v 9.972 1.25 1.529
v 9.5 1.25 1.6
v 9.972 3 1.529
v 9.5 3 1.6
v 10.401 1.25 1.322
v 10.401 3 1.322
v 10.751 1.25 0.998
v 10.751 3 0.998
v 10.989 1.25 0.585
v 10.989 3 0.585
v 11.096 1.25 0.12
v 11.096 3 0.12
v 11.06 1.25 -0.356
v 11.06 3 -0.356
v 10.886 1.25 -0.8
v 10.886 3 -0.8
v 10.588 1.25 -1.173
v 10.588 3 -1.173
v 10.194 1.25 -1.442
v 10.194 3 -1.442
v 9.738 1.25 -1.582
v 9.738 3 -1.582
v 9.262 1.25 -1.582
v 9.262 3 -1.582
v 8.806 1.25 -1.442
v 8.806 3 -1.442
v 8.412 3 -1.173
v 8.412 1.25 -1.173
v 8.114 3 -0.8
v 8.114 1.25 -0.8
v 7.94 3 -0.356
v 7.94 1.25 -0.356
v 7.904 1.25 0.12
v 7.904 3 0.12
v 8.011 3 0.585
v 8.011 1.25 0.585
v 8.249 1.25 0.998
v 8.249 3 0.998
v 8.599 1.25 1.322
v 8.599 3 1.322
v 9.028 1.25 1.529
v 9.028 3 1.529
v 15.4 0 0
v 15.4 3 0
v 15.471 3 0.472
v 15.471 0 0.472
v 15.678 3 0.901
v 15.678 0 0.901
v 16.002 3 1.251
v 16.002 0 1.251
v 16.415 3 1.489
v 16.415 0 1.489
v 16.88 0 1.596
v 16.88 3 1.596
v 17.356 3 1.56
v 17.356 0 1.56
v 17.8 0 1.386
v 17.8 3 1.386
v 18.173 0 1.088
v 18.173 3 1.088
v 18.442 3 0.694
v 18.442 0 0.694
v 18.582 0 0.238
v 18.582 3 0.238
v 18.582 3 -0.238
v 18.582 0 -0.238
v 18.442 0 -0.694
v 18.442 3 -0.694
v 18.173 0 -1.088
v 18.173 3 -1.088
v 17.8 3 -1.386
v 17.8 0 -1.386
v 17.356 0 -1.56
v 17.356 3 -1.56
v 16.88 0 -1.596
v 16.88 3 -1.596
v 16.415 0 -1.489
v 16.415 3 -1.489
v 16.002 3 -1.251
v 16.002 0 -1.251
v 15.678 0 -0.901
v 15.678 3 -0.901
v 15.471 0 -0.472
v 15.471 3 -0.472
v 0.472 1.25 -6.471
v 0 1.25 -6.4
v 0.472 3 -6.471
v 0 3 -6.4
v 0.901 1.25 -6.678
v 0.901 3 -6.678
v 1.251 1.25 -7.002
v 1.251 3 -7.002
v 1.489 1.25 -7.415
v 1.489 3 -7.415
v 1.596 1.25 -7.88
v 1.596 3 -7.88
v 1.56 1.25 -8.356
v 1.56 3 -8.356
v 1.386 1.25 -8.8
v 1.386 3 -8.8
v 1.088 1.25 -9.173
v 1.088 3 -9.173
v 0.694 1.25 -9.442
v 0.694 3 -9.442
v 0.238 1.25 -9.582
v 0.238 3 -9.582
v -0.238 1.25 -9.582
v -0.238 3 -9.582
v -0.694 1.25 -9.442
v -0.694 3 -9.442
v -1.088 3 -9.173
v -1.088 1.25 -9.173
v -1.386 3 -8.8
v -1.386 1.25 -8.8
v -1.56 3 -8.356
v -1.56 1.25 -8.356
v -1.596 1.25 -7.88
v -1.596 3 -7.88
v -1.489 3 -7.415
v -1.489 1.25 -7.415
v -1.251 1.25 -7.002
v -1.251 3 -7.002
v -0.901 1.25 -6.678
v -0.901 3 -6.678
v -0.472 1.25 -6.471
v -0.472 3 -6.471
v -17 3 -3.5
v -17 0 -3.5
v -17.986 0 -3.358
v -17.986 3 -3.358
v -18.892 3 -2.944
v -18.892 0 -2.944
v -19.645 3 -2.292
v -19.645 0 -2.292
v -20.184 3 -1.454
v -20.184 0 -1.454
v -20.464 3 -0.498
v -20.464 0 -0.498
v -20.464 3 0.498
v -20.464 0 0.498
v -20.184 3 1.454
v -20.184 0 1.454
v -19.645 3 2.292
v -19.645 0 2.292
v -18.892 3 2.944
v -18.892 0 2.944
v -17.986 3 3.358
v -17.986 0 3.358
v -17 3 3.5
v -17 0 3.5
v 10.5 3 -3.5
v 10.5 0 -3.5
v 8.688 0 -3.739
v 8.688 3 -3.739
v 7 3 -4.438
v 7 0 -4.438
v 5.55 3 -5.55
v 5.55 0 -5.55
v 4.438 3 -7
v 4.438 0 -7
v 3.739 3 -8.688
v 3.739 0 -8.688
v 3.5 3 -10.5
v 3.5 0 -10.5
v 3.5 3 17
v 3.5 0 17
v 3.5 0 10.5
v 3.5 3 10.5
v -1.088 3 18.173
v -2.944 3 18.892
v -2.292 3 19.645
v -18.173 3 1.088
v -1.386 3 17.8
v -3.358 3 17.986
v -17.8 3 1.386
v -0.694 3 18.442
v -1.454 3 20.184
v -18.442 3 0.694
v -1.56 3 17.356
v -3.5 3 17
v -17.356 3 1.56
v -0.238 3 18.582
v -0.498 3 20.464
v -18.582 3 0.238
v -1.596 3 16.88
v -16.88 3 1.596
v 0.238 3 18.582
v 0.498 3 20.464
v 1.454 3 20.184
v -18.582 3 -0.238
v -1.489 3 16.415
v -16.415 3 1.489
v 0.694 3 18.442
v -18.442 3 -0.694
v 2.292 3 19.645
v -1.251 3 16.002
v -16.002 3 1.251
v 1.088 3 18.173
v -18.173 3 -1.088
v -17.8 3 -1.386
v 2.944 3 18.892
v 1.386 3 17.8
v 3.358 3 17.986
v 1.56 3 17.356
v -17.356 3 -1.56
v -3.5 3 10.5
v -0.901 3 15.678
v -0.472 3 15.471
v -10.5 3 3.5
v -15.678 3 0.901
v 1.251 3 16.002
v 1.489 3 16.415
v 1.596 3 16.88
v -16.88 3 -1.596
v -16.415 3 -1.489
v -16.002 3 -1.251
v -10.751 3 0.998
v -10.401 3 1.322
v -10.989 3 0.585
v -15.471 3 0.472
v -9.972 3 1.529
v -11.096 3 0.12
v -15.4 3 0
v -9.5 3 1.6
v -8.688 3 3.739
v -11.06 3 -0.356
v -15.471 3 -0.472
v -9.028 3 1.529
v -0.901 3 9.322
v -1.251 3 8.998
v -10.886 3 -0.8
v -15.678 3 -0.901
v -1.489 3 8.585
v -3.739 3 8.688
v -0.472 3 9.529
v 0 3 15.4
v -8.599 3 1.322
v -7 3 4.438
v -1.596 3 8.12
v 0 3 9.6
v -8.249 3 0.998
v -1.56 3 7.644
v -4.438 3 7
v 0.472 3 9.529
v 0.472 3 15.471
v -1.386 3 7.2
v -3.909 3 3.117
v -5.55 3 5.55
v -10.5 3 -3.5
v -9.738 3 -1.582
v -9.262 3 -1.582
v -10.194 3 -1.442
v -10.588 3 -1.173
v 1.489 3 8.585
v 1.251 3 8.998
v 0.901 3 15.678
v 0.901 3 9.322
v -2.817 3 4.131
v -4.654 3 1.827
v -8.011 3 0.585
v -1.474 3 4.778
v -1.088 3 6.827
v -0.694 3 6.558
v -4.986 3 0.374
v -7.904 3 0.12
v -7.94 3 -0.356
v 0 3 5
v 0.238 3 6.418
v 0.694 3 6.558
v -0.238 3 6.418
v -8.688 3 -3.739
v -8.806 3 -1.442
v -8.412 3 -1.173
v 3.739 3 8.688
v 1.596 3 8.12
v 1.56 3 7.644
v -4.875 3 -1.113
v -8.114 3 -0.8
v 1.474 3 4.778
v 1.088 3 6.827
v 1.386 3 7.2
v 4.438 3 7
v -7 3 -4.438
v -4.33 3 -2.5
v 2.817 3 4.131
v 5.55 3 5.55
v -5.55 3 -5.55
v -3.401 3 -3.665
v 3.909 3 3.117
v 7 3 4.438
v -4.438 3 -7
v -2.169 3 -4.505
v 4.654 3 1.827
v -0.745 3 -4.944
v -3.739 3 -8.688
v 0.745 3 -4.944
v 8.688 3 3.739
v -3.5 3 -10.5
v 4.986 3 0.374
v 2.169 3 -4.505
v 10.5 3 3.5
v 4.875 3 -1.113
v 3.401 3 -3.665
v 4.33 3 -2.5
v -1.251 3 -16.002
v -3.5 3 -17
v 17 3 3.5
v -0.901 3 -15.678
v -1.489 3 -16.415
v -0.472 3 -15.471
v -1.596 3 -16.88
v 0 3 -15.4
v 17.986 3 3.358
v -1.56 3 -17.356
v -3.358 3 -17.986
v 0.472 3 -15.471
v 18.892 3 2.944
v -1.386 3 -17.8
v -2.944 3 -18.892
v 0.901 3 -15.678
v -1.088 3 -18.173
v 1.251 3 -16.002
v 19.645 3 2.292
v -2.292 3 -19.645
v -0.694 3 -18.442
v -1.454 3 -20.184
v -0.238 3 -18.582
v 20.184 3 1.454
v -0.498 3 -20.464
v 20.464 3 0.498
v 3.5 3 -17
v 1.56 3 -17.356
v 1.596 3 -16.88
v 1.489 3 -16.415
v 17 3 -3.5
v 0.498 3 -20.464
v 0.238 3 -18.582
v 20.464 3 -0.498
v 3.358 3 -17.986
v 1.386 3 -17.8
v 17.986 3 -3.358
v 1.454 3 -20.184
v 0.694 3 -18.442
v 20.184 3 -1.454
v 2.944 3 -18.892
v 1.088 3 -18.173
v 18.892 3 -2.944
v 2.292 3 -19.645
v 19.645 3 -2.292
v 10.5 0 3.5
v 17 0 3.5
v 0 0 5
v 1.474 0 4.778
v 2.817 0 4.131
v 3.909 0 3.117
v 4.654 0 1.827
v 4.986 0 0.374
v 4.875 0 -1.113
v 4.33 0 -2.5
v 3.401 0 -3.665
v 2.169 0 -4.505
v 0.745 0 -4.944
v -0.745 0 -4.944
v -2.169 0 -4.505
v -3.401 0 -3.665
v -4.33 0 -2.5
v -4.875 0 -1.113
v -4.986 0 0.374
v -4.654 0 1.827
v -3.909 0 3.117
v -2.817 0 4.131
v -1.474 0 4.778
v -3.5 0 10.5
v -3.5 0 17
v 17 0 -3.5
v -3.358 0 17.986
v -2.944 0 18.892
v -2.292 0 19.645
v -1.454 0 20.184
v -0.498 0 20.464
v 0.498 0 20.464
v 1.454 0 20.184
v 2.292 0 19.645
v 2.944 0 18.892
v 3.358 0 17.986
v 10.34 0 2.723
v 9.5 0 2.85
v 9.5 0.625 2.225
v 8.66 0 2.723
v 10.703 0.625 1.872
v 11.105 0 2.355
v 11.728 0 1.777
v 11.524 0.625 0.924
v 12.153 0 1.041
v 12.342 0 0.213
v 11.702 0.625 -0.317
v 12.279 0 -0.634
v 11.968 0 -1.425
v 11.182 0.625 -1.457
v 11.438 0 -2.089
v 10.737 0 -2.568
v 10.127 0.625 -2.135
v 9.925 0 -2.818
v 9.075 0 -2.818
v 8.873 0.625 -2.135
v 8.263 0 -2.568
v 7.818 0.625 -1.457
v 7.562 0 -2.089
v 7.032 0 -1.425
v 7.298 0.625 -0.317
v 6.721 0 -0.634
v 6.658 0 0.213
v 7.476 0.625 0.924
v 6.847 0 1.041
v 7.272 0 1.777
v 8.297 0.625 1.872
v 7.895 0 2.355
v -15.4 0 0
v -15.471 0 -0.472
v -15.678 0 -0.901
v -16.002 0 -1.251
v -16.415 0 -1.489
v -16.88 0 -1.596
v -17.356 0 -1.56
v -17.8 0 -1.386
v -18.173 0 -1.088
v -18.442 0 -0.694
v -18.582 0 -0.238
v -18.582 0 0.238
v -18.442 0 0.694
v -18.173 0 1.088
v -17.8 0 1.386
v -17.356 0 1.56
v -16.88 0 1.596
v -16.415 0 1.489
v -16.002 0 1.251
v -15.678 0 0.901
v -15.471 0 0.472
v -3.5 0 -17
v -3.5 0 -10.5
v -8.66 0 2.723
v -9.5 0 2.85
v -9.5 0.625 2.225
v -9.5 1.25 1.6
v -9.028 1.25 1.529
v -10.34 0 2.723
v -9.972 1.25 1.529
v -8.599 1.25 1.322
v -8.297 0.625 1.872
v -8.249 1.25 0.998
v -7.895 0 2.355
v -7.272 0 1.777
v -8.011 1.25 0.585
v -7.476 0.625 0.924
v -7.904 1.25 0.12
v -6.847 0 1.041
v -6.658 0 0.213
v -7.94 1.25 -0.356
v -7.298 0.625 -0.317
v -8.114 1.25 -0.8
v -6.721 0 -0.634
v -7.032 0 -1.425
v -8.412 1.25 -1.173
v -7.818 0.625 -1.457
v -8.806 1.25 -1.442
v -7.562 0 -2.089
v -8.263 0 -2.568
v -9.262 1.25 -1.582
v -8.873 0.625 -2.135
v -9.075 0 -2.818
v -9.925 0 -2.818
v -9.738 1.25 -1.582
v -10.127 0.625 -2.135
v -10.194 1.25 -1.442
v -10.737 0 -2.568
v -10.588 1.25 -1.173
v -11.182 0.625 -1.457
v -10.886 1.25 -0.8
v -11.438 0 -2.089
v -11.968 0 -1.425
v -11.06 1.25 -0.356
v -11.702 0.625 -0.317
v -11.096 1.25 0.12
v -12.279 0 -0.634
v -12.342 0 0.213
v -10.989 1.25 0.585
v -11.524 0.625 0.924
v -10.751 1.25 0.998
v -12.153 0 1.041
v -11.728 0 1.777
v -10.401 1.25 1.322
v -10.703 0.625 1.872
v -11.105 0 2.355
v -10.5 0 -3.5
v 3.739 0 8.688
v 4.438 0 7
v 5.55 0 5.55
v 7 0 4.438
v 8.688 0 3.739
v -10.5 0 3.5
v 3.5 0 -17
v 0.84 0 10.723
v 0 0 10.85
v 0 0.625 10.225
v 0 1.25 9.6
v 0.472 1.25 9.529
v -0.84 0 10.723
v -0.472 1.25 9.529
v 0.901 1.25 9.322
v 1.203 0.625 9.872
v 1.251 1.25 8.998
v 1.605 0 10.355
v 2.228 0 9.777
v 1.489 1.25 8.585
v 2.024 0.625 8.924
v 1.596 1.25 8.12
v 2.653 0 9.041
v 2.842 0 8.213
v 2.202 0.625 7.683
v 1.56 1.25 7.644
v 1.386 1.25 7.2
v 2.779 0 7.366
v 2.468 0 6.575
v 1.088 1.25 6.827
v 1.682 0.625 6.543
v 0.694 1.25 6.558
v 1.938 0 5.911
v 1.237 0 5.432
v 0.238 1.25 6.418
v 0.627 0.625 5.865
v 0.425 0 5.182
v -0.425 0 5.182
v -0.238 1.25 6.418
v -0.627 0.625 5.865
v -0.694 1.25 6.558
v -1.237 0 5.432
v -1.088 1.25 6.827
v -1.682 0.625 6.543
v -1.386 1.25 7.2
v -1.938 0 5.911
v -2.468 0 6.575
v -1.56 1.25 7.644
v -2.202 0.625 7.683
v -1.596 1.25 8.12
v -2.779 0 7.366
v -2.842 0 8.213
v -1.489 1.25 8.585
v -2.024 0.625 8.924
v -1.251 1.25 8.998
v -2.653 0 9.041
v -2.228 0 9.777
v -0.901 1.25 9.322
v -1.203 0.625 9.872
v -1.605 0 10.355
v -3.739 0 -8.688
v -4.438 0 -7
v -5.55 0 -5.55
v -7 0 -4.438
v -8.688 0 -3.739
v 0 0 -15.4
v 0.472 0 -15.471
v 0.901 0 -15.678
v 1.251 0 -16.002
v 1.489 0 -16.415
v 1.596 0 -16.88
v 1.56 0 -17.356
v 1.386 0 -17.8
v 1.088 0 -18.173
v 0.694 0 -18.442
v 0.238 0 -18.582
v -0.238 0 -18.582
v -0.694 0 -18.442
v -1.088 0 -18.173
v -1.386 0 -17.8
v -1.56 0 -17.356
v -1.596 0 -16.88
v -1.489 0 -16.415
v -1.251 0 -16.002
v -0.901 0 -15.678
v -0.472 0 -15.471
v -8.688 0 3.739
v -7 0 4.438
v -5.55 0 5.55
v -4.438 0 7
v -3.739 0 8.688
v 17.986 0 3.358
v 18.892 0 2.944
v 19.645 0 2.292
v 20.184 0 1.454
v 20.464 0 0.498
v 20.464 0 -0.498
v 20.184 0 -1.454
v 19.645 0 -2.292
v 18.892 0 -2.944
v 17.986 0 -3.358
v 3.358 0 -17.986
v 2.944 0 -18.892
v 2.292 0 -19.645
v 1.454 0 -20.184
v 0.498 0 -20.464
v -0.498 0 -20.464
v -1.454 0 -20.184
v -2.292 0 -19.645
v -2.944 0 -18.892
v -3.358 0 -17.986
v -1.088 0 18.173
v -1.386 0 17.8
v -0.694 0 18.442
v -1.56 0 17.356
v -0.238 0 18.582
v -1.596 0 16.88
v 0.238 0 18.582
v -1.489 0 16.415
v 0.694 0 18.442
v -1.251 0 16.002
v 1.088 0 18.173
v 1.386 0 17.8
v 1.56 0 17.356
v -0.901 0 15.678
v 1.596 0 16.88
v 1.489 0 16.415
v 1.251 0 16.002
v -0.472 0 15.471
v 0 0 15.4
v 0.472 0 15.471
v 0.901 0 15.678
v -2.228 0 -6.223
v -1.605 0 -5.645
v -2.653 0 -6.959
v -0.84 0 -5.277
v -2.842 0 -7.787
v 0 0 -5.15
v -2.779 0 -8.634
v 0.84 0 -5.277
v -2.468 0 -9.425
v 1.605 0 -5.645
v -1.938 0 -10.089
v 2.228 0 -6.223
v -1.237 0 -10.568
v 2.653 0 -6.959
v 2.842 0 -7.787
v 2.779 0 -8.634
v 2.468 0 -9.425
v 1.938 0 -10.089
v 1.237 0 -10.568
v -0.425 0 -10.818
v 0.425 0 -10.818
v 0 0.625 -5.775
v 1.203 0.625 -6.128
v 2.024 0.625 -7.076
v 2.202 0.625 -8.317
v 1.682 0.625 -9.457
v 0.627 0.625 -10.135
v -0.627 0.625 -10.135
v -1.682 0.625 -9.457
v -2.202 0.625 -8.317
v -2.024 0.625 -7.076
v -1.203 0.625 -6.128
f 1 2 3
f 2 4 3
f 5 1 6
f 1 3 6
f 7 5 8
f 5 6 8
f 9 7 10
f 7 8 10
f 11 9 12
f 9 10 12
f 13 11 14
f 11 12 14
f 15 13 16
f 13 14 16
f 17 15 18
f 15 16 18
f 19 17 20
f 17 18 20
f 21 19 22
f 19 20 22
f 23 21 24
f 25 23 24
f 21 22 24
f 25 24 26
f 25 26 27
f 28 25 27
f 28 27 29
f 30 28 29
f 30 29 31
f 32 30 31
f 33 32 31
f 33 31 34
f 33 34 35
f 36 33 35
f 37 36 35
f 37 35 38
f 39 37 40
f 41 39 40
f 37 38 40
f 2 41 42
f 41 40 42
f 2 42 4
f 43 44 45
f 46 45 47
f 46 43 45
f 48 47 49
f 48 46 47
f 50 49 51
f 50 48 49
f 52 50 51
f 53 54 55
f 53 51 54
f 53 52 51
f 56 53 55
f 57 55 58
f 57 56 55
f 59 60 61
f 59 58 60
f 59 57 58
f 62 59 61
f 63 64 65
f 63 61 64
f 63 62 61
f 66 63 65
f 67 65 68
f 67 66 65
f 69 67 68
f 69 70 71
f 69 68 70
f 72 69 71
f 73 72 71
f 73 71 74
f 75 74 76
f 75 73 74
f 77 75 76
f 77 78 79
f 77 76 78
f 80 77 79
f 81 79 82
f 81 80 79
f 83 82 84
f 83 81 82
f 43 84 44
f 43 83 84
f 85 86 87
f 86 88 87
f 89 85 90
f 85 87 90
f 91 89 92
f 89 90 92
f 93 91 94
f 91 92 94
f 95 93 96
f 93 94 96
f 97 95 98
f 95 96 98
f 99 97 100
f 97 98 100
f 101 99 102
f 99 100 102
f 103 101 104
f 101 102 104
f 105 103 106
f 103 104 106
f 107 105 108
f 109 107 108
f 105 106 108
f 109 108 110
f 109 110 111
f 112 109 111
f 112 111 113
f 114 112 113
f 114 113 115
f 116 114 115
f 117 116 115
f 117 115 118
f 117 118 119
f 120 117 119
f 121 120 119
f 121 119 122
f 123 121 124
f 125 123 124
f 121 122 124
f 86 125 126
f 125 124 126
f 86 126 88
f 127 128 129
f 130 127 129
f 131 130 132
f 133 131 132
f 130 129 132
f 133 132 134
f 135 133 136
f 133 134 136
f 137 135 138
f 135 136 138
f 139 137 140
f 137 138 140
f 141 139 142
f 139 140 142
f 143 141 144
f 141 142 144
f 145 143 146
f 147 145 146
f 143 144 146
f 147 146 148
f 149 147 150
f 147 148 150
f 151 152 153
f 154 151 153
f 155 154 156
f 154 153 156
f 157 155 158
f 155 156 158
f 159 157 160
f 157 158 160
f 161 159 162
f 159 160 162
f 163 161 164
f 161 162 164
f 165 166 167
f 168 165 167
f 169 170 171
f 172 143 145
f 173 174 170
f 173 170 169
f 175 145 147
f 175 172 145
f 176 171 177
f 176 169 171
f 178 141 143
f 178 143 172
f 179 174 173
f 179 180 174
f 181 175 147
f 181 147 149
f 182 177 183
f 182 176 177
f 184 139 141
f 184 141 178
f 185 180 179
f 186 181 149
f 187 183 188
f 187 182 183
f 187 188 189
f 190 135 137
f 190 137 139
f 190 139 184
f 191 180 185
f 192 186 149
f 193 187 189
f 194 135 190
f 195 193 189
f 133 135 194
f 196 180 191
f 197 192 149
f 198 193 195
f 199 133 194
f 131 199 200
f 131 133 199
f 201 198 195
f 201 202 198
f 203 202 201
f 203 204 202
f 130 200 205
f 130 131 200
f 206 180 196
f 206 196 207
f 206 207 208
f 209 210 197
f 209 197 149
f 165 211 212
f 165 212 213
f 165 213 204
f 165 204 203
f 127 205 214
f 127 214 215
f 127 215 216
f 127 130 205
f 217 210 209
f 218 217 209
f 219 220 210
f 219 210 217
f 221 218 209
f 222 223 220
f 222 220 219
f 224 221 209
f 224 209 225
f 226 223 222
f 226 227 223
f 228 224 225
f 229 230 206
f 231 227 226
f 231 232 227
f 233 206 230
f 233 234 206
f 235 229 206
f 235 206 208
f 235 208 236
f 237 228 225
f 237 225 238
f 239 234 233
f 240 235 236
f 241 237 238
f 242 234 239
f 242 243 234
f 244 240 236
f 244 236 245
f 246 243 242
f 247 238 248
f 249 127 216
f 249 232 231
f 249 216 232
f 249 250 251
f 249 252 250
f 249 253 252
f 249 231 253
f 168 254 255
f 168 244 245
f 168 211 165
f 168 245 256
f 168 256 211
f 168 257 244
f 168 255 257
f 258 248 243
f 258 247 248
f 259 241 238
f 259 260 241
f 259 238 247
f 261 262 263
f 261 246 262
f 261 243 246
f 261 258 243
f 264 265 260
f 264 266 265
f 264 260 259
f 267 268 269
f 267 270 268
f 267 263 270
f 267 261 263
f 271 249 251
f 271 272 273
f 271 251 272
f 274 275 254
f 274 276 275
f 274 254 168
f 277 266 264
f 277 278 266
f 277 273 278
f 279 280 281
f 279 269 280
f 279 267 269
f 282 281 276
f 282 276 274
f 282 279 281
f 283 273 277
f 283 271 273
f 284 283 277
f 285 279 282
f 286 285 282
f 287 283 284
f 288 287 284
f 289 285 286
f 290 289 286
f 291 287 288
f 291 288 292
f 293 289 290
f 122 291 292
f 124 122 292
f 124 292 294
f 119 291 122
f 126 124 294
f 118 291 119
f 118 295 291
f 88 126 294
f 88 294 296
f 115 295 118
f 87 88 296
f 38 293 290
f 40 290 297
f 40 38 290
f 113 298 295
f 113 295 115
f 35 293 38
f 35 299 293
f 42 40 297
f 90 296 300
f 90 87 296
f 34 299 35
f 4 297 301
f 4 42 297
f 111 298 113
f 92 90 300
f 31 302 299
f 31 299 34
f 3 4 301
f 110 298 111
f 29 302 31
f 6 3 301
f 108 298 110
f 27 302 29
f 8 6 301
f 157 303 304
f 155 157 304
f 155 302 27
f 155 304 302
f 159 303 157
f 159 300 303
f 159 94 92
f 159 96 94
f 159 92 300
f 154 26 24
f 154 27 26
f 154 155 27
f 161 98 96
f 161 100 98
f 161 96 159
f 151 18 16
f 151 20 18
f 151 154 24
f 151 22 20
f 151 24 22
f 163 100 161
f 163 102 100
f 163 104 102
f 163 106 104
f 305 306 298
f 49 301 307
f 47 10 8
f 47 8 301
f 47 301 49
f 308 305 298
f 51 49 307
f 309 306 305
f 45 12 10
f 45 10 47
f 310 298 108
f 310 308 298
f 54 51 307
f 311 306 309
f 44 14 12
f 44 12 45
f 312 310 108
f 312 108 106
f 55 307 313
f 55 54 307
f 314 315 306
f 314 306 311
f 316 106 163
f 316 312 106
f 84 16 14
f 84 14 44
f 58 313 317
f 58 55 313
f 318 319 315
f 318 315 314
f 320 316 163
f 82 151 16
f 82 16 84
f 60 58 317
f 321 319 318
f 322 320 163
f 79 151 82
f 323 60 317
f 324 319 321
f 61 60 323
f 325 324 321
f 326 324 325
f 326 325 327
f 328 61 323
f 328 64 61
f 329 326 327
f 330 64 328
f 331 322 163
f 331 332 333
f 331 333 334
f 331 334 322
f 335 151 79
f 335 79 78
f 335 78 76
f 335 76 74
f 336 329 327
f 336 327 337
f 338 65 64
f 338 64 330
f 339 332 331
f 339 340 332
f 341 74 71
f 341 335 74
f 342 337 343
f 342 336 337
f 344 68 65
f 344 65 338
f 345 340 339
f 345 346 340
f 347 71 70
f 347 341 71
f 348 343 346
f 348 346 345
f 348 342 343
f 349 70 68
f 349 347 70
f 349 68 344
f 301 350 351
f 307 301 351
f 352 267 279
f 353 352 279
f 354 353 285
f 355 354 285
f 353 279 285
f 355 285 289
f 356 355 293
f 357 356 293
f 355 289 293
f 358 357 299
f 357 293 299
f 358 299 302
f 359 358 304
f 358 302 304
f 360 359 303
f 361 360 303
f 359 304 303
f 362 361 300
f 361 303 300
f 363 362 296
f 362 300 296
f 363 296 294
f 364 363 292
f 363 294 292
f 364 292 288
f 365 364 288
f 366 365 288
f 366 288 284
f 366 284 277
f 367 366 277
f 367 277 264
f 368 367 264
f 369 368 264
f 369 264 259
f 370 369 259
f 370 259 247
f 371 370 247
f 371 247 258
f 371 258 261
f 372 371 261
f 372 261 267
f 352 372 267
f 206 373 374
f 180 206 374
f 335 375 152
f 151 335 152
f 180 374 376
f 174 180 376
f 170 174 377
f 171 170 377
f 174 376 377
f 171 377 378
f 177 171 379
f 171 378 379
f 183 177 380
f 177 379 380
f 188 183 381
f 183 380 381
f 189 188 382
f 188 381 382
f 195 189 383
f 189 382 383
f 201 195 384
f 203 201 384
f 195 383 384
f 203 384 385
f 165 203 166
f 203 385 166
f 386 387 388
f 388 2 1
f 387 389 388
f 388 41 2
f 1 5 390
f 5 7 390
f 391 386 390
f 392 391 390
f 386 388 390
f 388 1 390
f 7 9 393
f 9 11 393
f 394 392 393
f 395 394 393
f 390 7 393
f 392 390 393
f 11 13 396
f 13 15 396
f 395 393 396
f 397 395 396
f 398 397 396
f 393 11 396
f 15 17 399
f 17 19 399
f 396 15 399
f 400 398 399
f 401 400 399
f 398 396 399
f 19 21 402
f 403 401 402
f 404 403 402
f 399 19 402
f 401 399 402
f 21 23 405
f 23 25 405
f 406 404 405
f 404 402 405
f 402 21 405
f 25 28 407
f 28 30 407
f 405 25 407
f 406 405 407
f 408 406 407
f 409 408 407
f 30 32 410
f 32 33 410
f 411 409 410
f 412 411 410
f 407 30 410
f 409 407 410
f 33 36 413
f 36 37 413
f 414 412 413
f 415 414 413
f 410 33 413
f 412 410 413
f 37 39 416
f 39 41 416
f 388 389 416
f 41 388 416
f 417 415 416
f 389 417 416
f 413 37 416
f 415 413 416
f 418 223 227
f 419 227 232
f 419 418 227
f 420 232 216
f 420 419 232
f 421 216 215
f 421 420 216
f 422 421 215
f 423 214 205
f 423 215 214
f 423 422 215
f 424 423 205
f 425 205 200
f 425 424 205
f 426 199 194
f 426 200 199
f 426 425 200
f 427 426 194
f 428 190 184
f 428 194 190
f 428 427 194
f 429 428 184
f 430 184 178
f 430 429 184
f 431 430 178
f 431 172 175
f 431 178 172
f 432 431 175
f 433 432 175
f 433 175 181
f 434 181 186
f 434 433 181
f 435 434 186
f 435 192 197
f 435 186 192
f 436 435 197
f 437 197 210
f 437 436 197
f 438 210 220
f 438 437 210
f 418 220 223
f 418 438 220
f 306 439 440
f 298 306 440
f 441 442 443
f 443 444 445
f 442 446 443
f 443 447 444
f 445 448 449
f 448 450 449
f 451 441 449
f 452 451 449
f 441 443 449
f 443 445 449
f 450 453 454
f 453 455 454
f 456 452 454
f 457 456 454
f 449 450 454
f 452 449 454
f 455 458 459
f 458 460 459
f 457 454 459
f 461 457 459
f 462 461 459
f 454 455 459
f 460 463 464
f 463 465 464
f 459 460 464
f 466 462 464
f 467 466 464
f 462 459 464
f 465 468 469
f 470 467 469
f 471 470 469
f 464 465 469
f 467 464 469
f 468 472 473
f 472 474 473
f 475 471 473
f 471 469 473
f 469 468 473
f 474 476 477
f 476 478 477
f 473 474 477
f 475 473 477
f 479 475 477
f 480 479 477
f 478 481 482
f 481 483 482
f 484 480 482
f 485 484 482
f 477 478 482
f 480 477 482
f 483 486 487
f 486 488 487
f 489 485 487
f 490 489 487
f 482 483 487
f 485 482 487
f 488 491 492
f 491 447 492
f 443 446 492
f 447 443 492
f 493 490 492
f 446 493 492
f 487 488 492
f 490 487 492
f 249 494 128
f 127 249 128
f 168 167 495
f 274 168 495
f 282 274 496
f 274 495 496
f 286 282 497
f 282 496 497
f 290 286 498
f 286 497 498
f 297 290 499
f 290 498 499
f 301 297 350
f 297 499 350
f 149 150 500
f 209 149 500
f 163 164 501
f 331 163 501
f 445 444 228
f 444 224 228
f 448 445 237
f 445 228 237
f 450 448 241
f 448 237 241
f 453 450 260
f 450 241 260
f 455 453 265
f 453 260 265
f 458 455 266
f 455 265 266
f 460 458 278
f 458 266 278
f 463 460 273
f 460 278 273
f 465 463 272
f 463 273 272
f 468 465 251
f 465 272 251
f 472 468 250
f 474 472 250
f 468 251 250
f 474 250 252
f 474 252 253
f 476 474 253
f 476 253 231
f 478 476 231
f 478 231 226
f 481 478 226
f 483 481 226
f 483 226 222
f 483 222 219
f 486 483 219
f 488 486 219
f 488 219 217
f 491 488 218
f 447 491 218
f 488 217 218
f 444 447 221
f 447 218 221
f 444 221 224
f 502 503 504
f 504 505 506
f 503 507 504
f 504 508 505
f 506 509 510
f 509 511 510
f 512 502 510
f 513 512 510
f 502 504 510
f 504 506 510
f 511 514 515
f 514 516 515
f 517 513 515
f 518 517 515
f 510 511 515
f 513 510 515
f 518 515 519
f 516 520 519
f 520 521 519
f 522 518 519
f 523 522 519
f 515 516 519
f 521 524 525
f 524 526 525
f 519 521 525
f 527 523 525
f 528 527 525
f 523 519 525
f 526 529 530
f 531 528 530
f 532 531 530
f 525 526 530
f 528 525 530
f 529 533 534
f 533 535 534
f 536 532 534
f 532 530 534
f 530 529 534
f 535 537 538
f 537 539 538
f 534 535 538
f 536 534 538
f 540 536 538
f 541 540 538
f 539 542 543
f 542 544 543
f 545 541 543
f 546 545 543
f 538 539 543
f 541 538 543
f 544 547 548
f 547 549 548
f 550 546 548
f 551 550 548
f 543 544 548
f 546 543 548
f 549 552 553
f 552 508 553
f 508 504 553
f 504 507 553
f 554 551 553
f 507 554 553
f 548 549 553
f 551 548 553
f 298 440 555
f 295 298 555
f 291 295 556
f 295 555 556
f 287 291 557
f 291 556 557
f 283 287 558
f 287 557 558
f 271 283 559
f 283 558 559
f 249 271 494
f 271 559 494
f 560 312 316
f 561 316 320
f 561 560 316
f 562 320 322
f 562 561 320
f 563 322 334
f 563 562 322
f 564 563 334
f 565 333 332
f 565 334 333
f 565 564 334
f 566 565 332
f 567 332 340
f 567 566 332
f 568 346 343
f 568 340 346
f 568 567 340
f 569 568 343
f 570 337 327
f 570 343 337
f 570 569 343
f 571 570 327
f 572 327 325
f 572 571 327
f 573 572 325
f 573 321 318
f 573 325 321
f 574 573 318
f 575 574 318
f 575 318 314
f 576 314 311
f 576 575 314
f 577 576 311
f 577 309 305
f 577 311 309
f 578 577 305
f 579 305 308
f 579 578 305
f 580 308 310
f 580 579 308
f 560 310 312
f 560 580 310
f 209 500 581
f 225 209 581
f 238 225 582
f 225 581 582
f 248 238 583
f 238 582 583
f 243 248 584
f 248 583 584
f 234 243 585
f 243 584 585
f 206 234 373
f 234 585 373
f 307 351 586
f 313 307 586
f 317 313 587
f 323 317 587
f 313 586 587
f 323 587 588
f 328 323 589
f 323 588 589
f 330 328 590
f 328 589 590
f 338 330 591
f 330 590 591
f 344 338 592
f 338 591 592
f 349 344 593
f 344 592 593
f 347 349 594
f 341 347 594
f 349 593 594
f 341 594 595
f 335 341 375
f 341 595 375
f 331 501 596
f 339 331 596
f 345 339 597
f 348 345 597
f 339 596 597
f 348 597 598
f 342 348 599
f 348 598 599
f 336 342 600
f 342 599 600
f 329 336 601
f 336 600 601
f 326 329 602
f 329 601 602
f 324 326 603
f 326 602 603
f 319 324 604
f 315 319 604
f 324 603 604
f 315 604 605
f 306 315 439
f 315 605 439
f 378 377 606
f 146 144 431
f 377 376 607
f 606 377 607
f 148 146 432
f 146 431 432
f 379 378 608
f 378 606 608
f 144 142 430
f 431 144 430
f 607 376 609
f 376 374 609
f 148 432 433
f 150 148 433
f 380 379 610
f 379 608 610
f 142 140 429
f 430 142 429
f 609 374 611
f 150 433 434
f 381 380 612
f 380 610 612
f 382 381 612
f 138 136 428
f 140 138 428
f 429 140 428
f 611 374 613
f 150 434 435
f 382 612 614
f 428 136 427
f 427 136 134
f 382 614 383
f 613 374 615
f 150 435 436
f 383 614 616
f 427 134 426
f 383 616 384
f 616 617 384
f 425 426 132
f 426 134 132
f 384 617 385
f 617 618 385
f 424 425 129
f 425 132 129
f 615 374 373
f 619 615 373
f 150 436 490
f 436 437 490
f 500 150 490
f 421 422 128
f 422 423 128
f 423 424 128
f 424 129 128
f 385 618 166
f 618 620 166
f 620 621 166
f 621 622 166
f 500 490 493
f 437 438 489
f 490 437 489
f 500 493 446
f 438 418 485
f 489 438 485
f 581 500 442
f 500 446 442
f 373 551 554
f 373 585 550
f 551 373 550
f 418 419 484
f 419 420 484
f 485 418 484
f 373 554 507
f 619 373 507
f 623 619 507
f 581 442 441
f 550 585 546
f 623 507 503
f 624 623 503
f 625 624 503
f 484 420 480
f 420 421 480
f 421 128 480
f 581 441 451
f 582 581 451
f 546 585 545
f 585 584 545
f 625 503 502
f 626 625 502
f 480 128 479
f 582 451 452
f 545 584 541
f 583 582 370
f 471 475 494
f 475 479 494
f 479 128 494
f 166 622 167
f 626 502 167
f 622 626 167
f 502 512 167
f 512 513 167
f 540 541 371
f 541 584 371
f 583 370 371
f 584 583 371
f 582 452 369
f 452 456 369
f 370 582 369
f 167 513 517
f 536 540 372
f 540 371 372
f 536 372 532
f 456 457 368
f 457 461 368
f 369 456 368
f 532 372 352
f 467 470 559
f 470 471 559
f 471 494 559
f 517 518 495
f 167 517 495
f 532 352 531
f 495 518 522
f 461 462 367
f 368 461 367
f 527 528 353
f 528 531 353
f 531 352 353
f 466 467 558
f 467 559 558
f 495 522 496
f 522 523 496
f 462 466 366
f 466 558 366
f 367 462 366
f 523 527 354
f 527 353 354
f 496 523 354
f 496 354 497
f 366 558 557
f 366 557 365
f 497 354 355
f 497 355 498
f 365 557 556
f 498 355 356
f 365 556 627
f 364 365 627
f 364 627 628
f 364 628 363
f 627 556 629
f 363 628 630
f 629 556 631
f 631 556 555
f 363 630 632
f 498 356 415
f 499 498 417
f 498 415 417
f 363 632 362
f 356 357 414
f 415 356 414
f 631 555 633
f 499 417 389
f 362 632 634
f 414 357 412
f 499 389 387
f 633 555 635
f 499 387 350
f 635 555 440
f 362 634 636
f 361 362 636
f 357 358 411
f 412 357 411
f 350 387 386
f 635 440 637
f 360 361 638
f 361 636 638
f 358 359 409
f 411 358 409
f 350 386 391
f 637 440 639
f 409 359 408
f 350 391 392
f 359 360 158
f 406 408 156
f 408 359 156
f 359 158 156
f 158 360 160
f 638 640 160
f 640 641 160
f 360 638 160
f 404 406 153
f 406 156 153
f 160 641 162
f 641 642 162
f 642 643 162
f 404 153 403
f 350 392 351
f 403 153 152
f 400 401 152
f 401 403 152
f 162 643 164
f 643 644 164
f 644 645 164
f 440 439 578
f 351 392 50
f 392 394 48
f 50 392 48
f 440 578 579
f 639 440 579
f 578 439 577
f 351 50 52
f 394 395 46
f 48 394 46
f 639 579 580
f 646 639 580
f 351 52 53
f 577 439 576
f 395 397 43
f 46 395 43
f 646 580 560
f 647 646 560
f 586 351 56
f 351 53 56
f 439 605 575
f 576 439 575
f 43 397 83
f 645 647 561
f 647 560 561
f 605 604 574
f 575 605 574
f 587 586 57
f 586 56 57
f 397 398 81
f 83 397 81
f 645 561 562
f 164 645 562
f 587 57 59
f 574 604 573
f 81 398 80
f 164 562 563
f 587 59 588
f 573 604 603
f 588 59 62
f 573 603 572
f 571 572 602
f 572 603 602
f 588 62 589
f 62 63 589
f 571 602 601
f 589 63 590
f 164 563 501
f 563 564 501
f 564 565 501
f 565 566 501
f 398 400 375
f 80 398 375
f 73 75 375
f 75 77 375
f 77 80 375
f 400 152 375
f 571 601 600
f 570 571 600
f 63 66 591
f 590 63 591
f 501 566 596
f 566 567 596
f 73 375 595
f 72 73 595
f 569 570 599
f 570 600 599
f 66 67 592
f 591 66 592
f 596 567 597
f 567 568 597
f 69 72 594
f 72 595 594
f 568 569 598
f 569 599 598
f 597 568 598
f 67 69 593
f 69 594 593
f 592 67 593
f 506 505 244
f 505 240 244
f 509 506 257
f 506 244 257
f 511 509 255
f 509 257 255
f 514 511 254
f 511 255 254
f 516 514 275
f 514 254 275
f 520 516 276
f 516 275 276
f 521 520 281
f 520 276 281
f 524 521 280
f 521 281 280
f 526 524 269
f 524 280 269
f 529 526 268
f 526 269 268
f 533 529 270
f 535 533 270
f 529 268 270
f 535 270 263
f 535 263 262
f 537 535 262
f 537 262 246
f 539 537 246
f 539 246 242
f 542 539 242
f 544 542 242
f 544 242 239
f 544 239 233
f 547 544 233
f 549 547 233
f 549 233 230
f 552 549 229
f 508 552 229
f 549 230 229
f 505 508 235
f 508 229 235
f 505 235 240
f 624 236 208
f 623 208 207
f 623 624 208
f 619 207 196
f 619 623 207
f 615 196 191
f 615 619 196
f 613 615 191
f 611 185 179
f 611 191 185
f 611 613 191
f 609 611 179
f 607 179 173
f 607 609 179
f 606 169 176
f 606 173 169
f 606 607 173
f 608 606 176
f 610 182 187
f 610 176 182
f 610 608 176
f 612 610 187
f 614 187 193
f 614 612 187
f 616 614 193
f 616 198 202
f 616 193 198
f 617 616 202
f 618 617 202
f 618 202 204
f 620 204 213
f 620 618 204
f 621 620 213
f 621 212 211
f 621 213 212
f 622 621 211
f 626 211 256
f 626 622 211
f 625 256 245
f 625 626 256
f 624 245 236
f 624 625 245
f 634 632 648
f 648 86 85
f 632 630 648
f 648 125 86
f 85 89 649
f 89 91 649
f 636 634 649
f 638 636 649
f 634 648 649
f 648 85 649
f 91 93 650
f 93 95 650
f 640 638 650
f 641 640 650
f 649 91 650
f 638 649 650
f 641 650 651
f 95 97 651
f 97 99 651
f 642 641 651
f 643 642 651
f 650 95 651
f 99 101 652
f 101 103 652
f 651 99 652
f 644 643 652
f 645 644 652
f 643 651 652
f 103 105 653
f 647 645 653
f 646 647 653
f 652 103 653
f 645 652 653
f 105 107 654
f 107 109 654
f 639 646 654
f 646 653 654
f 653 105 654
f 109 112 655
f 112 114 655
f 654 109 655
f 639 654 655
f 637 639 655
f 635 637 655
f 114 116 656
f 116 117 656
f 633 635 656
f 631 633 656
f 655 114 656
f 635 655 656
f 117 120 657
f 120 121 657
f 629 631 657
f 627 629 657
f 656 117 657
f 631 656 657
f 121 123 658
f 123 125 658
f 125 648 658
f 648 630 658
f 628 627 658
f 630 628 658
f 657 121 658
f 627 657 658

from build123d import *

# Parameters (mm, degrees)
BOSS_EXTRUDE1_DEPTH                             = 3
F_10_0_10_DIAMETER_HOLE1_D                      = 10
F_10_0_10_DIAMETER_HOLE1_DEPTH                  = 10
F_10_0_10_DIAMETER_HOLE1_TIP                    = 3.004303095
CIRPATTERN1_COUNT                               = 4
CSK_FOR_M3_FLAT_HEAD_MACHINE_SCREW1_D           = 3.2
CSK_FOR_M3_FLAT_HEAD_MACHINE_SCREW1_CSINK_D     = 5.7
CSK_FOR_M3_FLAT_HEAD_MACHINE_SCREW1_CSINK_ANGLE = 90


with BuildPart() as part:
    # Sketch1 → Boss-Extrude1 (new body)
    with BuildSketch(Plane(origin=(0, 0, 0), x_dir=(1, 0, 0), z_dir=(0, 1, 0))):
        with BuildLine():
            ThreePointArc((-3.5, -17), (0, -20.5), (3.5, -17))
            Line((3.5, -17), (3.5, -10.5))
            ThreePointArc((3.5, -10.5), (5.550252532, -5.550252532), (10.5, -3.5))
            Line((10.5, -3.5), (17, -3.5))
            ThreePointArc((17, -3.5), (20.5, 0), (17, 3.5))
            Line((17, 3.5), (10.5, 3.5))
            ThreePointArc((10.5, 3.5), (5.550252532, 5.550252532), (3.5, 10.5))
            Line((3.5, 10.5), (3.5, 17))
            ThreePointArc((3.5, 17), (0, 20.5), (-3.5, 17))
            Line((-3.5, 17), (-3.5, 10.5))
            ThreePointArc((-3.5, 10.5), (-5.550252532, 5.550252532), (-10.5, 3.5))
            Line((-10.5, 3.5), (-17, 3.5))
            ThreePointArc((-17, 3.5), (-20.5, 0), (-17, -3.5))
            Line((-17, -3.5), (-10.5, -3.5))
            ThreePointArc((-10.5, -3.5), (-5.550252532, -5.550252532), (-3.5, -10.5))
            Line((-3.5, -10.5), (-3.5, -17))
        make_face()
    extrude(amount=BOSS_EXTRUDE1_DEPTH)

    # Ø10.0 (10) Diameter Hole1
    with Locations(Plane(origin=(0, 0, 0), x_dir=(0, 0, -1), z_dir=(0, -1, 0))):
        with Locations((0, 0)):
            Hole(F_10_0_10_DIAMETER_HOLE1_D / 2, depth=F_10_0_10_DIAMETER_HOLE1_DEPTH)
            with Locations((0, 0, -(F_10_0_10_DIAMETER_HOLE1_DEPTH + F_10_0_10_DIAMETER_HOLE1_TIP / 2))):  # 118° drill point
                Cone(0, F_10_0_10_DIAMETER_HOLE1_D / 2, F_10_0_10_DIAMETER_HOLE1_TIP, mode=Mode.SUBTRACT)

    # Sketch8 → Ø3.2 (3.2) Diameter Hole3 (revolve, cut)
    with BuildSketch(Plane(origin=(0, 0, 17), x_dir=(0, 0, -1), z_dir=(1, 0, 0))):
        Polygon((0, 0), (0, 10.96137699), (1.6, 10), (1.6, 0), align=None)
    f_3_2_3_2_diameter_hole3 = revolve(axis=Axis((0, -6.35, 17), (0, 1, 0)), mode=Mode.SUBTRACT)

    # CirPattern1: Ø3.2 (3.2) Diameter Hole3 ×4 about axis
    cirpattern1_axis = Axis((0, 0, 0), (0, 1, 0))
    for i in range(1, CIRPATTERN1_COUNT):
        add(f_3_2_3_2_diameter_hole3.rotate(cirpattern1_axis, i * 360 / CIRPATTERN1_COUNT), mode=Mode.SUBTRACT)

    # CSK for M3 Flat Head Machine Screw1 (through all)
    with Locations(Plane(origin=(0, 0, -8), x_dir=(0, 0, -1), z_dir=(0, -1, 0))):
        with Locations((0, 0), (-16, 0), (-8, -9.5), (-8, 9.5)):
            CounterSinkHole(CSK_FOR_M3_FLAT_HEAD_MACHINE_SCREW1_D / 2, CSK_FOR_M3_FLAT_HEAD_MACHINE_SCREW1_CSINK_D / 2, counter_sink_angle=CSK_FOR_M3_FLAT_HEAD_MACHINE_SCREW1_CSINK_ANGLE)


solid = part.part
